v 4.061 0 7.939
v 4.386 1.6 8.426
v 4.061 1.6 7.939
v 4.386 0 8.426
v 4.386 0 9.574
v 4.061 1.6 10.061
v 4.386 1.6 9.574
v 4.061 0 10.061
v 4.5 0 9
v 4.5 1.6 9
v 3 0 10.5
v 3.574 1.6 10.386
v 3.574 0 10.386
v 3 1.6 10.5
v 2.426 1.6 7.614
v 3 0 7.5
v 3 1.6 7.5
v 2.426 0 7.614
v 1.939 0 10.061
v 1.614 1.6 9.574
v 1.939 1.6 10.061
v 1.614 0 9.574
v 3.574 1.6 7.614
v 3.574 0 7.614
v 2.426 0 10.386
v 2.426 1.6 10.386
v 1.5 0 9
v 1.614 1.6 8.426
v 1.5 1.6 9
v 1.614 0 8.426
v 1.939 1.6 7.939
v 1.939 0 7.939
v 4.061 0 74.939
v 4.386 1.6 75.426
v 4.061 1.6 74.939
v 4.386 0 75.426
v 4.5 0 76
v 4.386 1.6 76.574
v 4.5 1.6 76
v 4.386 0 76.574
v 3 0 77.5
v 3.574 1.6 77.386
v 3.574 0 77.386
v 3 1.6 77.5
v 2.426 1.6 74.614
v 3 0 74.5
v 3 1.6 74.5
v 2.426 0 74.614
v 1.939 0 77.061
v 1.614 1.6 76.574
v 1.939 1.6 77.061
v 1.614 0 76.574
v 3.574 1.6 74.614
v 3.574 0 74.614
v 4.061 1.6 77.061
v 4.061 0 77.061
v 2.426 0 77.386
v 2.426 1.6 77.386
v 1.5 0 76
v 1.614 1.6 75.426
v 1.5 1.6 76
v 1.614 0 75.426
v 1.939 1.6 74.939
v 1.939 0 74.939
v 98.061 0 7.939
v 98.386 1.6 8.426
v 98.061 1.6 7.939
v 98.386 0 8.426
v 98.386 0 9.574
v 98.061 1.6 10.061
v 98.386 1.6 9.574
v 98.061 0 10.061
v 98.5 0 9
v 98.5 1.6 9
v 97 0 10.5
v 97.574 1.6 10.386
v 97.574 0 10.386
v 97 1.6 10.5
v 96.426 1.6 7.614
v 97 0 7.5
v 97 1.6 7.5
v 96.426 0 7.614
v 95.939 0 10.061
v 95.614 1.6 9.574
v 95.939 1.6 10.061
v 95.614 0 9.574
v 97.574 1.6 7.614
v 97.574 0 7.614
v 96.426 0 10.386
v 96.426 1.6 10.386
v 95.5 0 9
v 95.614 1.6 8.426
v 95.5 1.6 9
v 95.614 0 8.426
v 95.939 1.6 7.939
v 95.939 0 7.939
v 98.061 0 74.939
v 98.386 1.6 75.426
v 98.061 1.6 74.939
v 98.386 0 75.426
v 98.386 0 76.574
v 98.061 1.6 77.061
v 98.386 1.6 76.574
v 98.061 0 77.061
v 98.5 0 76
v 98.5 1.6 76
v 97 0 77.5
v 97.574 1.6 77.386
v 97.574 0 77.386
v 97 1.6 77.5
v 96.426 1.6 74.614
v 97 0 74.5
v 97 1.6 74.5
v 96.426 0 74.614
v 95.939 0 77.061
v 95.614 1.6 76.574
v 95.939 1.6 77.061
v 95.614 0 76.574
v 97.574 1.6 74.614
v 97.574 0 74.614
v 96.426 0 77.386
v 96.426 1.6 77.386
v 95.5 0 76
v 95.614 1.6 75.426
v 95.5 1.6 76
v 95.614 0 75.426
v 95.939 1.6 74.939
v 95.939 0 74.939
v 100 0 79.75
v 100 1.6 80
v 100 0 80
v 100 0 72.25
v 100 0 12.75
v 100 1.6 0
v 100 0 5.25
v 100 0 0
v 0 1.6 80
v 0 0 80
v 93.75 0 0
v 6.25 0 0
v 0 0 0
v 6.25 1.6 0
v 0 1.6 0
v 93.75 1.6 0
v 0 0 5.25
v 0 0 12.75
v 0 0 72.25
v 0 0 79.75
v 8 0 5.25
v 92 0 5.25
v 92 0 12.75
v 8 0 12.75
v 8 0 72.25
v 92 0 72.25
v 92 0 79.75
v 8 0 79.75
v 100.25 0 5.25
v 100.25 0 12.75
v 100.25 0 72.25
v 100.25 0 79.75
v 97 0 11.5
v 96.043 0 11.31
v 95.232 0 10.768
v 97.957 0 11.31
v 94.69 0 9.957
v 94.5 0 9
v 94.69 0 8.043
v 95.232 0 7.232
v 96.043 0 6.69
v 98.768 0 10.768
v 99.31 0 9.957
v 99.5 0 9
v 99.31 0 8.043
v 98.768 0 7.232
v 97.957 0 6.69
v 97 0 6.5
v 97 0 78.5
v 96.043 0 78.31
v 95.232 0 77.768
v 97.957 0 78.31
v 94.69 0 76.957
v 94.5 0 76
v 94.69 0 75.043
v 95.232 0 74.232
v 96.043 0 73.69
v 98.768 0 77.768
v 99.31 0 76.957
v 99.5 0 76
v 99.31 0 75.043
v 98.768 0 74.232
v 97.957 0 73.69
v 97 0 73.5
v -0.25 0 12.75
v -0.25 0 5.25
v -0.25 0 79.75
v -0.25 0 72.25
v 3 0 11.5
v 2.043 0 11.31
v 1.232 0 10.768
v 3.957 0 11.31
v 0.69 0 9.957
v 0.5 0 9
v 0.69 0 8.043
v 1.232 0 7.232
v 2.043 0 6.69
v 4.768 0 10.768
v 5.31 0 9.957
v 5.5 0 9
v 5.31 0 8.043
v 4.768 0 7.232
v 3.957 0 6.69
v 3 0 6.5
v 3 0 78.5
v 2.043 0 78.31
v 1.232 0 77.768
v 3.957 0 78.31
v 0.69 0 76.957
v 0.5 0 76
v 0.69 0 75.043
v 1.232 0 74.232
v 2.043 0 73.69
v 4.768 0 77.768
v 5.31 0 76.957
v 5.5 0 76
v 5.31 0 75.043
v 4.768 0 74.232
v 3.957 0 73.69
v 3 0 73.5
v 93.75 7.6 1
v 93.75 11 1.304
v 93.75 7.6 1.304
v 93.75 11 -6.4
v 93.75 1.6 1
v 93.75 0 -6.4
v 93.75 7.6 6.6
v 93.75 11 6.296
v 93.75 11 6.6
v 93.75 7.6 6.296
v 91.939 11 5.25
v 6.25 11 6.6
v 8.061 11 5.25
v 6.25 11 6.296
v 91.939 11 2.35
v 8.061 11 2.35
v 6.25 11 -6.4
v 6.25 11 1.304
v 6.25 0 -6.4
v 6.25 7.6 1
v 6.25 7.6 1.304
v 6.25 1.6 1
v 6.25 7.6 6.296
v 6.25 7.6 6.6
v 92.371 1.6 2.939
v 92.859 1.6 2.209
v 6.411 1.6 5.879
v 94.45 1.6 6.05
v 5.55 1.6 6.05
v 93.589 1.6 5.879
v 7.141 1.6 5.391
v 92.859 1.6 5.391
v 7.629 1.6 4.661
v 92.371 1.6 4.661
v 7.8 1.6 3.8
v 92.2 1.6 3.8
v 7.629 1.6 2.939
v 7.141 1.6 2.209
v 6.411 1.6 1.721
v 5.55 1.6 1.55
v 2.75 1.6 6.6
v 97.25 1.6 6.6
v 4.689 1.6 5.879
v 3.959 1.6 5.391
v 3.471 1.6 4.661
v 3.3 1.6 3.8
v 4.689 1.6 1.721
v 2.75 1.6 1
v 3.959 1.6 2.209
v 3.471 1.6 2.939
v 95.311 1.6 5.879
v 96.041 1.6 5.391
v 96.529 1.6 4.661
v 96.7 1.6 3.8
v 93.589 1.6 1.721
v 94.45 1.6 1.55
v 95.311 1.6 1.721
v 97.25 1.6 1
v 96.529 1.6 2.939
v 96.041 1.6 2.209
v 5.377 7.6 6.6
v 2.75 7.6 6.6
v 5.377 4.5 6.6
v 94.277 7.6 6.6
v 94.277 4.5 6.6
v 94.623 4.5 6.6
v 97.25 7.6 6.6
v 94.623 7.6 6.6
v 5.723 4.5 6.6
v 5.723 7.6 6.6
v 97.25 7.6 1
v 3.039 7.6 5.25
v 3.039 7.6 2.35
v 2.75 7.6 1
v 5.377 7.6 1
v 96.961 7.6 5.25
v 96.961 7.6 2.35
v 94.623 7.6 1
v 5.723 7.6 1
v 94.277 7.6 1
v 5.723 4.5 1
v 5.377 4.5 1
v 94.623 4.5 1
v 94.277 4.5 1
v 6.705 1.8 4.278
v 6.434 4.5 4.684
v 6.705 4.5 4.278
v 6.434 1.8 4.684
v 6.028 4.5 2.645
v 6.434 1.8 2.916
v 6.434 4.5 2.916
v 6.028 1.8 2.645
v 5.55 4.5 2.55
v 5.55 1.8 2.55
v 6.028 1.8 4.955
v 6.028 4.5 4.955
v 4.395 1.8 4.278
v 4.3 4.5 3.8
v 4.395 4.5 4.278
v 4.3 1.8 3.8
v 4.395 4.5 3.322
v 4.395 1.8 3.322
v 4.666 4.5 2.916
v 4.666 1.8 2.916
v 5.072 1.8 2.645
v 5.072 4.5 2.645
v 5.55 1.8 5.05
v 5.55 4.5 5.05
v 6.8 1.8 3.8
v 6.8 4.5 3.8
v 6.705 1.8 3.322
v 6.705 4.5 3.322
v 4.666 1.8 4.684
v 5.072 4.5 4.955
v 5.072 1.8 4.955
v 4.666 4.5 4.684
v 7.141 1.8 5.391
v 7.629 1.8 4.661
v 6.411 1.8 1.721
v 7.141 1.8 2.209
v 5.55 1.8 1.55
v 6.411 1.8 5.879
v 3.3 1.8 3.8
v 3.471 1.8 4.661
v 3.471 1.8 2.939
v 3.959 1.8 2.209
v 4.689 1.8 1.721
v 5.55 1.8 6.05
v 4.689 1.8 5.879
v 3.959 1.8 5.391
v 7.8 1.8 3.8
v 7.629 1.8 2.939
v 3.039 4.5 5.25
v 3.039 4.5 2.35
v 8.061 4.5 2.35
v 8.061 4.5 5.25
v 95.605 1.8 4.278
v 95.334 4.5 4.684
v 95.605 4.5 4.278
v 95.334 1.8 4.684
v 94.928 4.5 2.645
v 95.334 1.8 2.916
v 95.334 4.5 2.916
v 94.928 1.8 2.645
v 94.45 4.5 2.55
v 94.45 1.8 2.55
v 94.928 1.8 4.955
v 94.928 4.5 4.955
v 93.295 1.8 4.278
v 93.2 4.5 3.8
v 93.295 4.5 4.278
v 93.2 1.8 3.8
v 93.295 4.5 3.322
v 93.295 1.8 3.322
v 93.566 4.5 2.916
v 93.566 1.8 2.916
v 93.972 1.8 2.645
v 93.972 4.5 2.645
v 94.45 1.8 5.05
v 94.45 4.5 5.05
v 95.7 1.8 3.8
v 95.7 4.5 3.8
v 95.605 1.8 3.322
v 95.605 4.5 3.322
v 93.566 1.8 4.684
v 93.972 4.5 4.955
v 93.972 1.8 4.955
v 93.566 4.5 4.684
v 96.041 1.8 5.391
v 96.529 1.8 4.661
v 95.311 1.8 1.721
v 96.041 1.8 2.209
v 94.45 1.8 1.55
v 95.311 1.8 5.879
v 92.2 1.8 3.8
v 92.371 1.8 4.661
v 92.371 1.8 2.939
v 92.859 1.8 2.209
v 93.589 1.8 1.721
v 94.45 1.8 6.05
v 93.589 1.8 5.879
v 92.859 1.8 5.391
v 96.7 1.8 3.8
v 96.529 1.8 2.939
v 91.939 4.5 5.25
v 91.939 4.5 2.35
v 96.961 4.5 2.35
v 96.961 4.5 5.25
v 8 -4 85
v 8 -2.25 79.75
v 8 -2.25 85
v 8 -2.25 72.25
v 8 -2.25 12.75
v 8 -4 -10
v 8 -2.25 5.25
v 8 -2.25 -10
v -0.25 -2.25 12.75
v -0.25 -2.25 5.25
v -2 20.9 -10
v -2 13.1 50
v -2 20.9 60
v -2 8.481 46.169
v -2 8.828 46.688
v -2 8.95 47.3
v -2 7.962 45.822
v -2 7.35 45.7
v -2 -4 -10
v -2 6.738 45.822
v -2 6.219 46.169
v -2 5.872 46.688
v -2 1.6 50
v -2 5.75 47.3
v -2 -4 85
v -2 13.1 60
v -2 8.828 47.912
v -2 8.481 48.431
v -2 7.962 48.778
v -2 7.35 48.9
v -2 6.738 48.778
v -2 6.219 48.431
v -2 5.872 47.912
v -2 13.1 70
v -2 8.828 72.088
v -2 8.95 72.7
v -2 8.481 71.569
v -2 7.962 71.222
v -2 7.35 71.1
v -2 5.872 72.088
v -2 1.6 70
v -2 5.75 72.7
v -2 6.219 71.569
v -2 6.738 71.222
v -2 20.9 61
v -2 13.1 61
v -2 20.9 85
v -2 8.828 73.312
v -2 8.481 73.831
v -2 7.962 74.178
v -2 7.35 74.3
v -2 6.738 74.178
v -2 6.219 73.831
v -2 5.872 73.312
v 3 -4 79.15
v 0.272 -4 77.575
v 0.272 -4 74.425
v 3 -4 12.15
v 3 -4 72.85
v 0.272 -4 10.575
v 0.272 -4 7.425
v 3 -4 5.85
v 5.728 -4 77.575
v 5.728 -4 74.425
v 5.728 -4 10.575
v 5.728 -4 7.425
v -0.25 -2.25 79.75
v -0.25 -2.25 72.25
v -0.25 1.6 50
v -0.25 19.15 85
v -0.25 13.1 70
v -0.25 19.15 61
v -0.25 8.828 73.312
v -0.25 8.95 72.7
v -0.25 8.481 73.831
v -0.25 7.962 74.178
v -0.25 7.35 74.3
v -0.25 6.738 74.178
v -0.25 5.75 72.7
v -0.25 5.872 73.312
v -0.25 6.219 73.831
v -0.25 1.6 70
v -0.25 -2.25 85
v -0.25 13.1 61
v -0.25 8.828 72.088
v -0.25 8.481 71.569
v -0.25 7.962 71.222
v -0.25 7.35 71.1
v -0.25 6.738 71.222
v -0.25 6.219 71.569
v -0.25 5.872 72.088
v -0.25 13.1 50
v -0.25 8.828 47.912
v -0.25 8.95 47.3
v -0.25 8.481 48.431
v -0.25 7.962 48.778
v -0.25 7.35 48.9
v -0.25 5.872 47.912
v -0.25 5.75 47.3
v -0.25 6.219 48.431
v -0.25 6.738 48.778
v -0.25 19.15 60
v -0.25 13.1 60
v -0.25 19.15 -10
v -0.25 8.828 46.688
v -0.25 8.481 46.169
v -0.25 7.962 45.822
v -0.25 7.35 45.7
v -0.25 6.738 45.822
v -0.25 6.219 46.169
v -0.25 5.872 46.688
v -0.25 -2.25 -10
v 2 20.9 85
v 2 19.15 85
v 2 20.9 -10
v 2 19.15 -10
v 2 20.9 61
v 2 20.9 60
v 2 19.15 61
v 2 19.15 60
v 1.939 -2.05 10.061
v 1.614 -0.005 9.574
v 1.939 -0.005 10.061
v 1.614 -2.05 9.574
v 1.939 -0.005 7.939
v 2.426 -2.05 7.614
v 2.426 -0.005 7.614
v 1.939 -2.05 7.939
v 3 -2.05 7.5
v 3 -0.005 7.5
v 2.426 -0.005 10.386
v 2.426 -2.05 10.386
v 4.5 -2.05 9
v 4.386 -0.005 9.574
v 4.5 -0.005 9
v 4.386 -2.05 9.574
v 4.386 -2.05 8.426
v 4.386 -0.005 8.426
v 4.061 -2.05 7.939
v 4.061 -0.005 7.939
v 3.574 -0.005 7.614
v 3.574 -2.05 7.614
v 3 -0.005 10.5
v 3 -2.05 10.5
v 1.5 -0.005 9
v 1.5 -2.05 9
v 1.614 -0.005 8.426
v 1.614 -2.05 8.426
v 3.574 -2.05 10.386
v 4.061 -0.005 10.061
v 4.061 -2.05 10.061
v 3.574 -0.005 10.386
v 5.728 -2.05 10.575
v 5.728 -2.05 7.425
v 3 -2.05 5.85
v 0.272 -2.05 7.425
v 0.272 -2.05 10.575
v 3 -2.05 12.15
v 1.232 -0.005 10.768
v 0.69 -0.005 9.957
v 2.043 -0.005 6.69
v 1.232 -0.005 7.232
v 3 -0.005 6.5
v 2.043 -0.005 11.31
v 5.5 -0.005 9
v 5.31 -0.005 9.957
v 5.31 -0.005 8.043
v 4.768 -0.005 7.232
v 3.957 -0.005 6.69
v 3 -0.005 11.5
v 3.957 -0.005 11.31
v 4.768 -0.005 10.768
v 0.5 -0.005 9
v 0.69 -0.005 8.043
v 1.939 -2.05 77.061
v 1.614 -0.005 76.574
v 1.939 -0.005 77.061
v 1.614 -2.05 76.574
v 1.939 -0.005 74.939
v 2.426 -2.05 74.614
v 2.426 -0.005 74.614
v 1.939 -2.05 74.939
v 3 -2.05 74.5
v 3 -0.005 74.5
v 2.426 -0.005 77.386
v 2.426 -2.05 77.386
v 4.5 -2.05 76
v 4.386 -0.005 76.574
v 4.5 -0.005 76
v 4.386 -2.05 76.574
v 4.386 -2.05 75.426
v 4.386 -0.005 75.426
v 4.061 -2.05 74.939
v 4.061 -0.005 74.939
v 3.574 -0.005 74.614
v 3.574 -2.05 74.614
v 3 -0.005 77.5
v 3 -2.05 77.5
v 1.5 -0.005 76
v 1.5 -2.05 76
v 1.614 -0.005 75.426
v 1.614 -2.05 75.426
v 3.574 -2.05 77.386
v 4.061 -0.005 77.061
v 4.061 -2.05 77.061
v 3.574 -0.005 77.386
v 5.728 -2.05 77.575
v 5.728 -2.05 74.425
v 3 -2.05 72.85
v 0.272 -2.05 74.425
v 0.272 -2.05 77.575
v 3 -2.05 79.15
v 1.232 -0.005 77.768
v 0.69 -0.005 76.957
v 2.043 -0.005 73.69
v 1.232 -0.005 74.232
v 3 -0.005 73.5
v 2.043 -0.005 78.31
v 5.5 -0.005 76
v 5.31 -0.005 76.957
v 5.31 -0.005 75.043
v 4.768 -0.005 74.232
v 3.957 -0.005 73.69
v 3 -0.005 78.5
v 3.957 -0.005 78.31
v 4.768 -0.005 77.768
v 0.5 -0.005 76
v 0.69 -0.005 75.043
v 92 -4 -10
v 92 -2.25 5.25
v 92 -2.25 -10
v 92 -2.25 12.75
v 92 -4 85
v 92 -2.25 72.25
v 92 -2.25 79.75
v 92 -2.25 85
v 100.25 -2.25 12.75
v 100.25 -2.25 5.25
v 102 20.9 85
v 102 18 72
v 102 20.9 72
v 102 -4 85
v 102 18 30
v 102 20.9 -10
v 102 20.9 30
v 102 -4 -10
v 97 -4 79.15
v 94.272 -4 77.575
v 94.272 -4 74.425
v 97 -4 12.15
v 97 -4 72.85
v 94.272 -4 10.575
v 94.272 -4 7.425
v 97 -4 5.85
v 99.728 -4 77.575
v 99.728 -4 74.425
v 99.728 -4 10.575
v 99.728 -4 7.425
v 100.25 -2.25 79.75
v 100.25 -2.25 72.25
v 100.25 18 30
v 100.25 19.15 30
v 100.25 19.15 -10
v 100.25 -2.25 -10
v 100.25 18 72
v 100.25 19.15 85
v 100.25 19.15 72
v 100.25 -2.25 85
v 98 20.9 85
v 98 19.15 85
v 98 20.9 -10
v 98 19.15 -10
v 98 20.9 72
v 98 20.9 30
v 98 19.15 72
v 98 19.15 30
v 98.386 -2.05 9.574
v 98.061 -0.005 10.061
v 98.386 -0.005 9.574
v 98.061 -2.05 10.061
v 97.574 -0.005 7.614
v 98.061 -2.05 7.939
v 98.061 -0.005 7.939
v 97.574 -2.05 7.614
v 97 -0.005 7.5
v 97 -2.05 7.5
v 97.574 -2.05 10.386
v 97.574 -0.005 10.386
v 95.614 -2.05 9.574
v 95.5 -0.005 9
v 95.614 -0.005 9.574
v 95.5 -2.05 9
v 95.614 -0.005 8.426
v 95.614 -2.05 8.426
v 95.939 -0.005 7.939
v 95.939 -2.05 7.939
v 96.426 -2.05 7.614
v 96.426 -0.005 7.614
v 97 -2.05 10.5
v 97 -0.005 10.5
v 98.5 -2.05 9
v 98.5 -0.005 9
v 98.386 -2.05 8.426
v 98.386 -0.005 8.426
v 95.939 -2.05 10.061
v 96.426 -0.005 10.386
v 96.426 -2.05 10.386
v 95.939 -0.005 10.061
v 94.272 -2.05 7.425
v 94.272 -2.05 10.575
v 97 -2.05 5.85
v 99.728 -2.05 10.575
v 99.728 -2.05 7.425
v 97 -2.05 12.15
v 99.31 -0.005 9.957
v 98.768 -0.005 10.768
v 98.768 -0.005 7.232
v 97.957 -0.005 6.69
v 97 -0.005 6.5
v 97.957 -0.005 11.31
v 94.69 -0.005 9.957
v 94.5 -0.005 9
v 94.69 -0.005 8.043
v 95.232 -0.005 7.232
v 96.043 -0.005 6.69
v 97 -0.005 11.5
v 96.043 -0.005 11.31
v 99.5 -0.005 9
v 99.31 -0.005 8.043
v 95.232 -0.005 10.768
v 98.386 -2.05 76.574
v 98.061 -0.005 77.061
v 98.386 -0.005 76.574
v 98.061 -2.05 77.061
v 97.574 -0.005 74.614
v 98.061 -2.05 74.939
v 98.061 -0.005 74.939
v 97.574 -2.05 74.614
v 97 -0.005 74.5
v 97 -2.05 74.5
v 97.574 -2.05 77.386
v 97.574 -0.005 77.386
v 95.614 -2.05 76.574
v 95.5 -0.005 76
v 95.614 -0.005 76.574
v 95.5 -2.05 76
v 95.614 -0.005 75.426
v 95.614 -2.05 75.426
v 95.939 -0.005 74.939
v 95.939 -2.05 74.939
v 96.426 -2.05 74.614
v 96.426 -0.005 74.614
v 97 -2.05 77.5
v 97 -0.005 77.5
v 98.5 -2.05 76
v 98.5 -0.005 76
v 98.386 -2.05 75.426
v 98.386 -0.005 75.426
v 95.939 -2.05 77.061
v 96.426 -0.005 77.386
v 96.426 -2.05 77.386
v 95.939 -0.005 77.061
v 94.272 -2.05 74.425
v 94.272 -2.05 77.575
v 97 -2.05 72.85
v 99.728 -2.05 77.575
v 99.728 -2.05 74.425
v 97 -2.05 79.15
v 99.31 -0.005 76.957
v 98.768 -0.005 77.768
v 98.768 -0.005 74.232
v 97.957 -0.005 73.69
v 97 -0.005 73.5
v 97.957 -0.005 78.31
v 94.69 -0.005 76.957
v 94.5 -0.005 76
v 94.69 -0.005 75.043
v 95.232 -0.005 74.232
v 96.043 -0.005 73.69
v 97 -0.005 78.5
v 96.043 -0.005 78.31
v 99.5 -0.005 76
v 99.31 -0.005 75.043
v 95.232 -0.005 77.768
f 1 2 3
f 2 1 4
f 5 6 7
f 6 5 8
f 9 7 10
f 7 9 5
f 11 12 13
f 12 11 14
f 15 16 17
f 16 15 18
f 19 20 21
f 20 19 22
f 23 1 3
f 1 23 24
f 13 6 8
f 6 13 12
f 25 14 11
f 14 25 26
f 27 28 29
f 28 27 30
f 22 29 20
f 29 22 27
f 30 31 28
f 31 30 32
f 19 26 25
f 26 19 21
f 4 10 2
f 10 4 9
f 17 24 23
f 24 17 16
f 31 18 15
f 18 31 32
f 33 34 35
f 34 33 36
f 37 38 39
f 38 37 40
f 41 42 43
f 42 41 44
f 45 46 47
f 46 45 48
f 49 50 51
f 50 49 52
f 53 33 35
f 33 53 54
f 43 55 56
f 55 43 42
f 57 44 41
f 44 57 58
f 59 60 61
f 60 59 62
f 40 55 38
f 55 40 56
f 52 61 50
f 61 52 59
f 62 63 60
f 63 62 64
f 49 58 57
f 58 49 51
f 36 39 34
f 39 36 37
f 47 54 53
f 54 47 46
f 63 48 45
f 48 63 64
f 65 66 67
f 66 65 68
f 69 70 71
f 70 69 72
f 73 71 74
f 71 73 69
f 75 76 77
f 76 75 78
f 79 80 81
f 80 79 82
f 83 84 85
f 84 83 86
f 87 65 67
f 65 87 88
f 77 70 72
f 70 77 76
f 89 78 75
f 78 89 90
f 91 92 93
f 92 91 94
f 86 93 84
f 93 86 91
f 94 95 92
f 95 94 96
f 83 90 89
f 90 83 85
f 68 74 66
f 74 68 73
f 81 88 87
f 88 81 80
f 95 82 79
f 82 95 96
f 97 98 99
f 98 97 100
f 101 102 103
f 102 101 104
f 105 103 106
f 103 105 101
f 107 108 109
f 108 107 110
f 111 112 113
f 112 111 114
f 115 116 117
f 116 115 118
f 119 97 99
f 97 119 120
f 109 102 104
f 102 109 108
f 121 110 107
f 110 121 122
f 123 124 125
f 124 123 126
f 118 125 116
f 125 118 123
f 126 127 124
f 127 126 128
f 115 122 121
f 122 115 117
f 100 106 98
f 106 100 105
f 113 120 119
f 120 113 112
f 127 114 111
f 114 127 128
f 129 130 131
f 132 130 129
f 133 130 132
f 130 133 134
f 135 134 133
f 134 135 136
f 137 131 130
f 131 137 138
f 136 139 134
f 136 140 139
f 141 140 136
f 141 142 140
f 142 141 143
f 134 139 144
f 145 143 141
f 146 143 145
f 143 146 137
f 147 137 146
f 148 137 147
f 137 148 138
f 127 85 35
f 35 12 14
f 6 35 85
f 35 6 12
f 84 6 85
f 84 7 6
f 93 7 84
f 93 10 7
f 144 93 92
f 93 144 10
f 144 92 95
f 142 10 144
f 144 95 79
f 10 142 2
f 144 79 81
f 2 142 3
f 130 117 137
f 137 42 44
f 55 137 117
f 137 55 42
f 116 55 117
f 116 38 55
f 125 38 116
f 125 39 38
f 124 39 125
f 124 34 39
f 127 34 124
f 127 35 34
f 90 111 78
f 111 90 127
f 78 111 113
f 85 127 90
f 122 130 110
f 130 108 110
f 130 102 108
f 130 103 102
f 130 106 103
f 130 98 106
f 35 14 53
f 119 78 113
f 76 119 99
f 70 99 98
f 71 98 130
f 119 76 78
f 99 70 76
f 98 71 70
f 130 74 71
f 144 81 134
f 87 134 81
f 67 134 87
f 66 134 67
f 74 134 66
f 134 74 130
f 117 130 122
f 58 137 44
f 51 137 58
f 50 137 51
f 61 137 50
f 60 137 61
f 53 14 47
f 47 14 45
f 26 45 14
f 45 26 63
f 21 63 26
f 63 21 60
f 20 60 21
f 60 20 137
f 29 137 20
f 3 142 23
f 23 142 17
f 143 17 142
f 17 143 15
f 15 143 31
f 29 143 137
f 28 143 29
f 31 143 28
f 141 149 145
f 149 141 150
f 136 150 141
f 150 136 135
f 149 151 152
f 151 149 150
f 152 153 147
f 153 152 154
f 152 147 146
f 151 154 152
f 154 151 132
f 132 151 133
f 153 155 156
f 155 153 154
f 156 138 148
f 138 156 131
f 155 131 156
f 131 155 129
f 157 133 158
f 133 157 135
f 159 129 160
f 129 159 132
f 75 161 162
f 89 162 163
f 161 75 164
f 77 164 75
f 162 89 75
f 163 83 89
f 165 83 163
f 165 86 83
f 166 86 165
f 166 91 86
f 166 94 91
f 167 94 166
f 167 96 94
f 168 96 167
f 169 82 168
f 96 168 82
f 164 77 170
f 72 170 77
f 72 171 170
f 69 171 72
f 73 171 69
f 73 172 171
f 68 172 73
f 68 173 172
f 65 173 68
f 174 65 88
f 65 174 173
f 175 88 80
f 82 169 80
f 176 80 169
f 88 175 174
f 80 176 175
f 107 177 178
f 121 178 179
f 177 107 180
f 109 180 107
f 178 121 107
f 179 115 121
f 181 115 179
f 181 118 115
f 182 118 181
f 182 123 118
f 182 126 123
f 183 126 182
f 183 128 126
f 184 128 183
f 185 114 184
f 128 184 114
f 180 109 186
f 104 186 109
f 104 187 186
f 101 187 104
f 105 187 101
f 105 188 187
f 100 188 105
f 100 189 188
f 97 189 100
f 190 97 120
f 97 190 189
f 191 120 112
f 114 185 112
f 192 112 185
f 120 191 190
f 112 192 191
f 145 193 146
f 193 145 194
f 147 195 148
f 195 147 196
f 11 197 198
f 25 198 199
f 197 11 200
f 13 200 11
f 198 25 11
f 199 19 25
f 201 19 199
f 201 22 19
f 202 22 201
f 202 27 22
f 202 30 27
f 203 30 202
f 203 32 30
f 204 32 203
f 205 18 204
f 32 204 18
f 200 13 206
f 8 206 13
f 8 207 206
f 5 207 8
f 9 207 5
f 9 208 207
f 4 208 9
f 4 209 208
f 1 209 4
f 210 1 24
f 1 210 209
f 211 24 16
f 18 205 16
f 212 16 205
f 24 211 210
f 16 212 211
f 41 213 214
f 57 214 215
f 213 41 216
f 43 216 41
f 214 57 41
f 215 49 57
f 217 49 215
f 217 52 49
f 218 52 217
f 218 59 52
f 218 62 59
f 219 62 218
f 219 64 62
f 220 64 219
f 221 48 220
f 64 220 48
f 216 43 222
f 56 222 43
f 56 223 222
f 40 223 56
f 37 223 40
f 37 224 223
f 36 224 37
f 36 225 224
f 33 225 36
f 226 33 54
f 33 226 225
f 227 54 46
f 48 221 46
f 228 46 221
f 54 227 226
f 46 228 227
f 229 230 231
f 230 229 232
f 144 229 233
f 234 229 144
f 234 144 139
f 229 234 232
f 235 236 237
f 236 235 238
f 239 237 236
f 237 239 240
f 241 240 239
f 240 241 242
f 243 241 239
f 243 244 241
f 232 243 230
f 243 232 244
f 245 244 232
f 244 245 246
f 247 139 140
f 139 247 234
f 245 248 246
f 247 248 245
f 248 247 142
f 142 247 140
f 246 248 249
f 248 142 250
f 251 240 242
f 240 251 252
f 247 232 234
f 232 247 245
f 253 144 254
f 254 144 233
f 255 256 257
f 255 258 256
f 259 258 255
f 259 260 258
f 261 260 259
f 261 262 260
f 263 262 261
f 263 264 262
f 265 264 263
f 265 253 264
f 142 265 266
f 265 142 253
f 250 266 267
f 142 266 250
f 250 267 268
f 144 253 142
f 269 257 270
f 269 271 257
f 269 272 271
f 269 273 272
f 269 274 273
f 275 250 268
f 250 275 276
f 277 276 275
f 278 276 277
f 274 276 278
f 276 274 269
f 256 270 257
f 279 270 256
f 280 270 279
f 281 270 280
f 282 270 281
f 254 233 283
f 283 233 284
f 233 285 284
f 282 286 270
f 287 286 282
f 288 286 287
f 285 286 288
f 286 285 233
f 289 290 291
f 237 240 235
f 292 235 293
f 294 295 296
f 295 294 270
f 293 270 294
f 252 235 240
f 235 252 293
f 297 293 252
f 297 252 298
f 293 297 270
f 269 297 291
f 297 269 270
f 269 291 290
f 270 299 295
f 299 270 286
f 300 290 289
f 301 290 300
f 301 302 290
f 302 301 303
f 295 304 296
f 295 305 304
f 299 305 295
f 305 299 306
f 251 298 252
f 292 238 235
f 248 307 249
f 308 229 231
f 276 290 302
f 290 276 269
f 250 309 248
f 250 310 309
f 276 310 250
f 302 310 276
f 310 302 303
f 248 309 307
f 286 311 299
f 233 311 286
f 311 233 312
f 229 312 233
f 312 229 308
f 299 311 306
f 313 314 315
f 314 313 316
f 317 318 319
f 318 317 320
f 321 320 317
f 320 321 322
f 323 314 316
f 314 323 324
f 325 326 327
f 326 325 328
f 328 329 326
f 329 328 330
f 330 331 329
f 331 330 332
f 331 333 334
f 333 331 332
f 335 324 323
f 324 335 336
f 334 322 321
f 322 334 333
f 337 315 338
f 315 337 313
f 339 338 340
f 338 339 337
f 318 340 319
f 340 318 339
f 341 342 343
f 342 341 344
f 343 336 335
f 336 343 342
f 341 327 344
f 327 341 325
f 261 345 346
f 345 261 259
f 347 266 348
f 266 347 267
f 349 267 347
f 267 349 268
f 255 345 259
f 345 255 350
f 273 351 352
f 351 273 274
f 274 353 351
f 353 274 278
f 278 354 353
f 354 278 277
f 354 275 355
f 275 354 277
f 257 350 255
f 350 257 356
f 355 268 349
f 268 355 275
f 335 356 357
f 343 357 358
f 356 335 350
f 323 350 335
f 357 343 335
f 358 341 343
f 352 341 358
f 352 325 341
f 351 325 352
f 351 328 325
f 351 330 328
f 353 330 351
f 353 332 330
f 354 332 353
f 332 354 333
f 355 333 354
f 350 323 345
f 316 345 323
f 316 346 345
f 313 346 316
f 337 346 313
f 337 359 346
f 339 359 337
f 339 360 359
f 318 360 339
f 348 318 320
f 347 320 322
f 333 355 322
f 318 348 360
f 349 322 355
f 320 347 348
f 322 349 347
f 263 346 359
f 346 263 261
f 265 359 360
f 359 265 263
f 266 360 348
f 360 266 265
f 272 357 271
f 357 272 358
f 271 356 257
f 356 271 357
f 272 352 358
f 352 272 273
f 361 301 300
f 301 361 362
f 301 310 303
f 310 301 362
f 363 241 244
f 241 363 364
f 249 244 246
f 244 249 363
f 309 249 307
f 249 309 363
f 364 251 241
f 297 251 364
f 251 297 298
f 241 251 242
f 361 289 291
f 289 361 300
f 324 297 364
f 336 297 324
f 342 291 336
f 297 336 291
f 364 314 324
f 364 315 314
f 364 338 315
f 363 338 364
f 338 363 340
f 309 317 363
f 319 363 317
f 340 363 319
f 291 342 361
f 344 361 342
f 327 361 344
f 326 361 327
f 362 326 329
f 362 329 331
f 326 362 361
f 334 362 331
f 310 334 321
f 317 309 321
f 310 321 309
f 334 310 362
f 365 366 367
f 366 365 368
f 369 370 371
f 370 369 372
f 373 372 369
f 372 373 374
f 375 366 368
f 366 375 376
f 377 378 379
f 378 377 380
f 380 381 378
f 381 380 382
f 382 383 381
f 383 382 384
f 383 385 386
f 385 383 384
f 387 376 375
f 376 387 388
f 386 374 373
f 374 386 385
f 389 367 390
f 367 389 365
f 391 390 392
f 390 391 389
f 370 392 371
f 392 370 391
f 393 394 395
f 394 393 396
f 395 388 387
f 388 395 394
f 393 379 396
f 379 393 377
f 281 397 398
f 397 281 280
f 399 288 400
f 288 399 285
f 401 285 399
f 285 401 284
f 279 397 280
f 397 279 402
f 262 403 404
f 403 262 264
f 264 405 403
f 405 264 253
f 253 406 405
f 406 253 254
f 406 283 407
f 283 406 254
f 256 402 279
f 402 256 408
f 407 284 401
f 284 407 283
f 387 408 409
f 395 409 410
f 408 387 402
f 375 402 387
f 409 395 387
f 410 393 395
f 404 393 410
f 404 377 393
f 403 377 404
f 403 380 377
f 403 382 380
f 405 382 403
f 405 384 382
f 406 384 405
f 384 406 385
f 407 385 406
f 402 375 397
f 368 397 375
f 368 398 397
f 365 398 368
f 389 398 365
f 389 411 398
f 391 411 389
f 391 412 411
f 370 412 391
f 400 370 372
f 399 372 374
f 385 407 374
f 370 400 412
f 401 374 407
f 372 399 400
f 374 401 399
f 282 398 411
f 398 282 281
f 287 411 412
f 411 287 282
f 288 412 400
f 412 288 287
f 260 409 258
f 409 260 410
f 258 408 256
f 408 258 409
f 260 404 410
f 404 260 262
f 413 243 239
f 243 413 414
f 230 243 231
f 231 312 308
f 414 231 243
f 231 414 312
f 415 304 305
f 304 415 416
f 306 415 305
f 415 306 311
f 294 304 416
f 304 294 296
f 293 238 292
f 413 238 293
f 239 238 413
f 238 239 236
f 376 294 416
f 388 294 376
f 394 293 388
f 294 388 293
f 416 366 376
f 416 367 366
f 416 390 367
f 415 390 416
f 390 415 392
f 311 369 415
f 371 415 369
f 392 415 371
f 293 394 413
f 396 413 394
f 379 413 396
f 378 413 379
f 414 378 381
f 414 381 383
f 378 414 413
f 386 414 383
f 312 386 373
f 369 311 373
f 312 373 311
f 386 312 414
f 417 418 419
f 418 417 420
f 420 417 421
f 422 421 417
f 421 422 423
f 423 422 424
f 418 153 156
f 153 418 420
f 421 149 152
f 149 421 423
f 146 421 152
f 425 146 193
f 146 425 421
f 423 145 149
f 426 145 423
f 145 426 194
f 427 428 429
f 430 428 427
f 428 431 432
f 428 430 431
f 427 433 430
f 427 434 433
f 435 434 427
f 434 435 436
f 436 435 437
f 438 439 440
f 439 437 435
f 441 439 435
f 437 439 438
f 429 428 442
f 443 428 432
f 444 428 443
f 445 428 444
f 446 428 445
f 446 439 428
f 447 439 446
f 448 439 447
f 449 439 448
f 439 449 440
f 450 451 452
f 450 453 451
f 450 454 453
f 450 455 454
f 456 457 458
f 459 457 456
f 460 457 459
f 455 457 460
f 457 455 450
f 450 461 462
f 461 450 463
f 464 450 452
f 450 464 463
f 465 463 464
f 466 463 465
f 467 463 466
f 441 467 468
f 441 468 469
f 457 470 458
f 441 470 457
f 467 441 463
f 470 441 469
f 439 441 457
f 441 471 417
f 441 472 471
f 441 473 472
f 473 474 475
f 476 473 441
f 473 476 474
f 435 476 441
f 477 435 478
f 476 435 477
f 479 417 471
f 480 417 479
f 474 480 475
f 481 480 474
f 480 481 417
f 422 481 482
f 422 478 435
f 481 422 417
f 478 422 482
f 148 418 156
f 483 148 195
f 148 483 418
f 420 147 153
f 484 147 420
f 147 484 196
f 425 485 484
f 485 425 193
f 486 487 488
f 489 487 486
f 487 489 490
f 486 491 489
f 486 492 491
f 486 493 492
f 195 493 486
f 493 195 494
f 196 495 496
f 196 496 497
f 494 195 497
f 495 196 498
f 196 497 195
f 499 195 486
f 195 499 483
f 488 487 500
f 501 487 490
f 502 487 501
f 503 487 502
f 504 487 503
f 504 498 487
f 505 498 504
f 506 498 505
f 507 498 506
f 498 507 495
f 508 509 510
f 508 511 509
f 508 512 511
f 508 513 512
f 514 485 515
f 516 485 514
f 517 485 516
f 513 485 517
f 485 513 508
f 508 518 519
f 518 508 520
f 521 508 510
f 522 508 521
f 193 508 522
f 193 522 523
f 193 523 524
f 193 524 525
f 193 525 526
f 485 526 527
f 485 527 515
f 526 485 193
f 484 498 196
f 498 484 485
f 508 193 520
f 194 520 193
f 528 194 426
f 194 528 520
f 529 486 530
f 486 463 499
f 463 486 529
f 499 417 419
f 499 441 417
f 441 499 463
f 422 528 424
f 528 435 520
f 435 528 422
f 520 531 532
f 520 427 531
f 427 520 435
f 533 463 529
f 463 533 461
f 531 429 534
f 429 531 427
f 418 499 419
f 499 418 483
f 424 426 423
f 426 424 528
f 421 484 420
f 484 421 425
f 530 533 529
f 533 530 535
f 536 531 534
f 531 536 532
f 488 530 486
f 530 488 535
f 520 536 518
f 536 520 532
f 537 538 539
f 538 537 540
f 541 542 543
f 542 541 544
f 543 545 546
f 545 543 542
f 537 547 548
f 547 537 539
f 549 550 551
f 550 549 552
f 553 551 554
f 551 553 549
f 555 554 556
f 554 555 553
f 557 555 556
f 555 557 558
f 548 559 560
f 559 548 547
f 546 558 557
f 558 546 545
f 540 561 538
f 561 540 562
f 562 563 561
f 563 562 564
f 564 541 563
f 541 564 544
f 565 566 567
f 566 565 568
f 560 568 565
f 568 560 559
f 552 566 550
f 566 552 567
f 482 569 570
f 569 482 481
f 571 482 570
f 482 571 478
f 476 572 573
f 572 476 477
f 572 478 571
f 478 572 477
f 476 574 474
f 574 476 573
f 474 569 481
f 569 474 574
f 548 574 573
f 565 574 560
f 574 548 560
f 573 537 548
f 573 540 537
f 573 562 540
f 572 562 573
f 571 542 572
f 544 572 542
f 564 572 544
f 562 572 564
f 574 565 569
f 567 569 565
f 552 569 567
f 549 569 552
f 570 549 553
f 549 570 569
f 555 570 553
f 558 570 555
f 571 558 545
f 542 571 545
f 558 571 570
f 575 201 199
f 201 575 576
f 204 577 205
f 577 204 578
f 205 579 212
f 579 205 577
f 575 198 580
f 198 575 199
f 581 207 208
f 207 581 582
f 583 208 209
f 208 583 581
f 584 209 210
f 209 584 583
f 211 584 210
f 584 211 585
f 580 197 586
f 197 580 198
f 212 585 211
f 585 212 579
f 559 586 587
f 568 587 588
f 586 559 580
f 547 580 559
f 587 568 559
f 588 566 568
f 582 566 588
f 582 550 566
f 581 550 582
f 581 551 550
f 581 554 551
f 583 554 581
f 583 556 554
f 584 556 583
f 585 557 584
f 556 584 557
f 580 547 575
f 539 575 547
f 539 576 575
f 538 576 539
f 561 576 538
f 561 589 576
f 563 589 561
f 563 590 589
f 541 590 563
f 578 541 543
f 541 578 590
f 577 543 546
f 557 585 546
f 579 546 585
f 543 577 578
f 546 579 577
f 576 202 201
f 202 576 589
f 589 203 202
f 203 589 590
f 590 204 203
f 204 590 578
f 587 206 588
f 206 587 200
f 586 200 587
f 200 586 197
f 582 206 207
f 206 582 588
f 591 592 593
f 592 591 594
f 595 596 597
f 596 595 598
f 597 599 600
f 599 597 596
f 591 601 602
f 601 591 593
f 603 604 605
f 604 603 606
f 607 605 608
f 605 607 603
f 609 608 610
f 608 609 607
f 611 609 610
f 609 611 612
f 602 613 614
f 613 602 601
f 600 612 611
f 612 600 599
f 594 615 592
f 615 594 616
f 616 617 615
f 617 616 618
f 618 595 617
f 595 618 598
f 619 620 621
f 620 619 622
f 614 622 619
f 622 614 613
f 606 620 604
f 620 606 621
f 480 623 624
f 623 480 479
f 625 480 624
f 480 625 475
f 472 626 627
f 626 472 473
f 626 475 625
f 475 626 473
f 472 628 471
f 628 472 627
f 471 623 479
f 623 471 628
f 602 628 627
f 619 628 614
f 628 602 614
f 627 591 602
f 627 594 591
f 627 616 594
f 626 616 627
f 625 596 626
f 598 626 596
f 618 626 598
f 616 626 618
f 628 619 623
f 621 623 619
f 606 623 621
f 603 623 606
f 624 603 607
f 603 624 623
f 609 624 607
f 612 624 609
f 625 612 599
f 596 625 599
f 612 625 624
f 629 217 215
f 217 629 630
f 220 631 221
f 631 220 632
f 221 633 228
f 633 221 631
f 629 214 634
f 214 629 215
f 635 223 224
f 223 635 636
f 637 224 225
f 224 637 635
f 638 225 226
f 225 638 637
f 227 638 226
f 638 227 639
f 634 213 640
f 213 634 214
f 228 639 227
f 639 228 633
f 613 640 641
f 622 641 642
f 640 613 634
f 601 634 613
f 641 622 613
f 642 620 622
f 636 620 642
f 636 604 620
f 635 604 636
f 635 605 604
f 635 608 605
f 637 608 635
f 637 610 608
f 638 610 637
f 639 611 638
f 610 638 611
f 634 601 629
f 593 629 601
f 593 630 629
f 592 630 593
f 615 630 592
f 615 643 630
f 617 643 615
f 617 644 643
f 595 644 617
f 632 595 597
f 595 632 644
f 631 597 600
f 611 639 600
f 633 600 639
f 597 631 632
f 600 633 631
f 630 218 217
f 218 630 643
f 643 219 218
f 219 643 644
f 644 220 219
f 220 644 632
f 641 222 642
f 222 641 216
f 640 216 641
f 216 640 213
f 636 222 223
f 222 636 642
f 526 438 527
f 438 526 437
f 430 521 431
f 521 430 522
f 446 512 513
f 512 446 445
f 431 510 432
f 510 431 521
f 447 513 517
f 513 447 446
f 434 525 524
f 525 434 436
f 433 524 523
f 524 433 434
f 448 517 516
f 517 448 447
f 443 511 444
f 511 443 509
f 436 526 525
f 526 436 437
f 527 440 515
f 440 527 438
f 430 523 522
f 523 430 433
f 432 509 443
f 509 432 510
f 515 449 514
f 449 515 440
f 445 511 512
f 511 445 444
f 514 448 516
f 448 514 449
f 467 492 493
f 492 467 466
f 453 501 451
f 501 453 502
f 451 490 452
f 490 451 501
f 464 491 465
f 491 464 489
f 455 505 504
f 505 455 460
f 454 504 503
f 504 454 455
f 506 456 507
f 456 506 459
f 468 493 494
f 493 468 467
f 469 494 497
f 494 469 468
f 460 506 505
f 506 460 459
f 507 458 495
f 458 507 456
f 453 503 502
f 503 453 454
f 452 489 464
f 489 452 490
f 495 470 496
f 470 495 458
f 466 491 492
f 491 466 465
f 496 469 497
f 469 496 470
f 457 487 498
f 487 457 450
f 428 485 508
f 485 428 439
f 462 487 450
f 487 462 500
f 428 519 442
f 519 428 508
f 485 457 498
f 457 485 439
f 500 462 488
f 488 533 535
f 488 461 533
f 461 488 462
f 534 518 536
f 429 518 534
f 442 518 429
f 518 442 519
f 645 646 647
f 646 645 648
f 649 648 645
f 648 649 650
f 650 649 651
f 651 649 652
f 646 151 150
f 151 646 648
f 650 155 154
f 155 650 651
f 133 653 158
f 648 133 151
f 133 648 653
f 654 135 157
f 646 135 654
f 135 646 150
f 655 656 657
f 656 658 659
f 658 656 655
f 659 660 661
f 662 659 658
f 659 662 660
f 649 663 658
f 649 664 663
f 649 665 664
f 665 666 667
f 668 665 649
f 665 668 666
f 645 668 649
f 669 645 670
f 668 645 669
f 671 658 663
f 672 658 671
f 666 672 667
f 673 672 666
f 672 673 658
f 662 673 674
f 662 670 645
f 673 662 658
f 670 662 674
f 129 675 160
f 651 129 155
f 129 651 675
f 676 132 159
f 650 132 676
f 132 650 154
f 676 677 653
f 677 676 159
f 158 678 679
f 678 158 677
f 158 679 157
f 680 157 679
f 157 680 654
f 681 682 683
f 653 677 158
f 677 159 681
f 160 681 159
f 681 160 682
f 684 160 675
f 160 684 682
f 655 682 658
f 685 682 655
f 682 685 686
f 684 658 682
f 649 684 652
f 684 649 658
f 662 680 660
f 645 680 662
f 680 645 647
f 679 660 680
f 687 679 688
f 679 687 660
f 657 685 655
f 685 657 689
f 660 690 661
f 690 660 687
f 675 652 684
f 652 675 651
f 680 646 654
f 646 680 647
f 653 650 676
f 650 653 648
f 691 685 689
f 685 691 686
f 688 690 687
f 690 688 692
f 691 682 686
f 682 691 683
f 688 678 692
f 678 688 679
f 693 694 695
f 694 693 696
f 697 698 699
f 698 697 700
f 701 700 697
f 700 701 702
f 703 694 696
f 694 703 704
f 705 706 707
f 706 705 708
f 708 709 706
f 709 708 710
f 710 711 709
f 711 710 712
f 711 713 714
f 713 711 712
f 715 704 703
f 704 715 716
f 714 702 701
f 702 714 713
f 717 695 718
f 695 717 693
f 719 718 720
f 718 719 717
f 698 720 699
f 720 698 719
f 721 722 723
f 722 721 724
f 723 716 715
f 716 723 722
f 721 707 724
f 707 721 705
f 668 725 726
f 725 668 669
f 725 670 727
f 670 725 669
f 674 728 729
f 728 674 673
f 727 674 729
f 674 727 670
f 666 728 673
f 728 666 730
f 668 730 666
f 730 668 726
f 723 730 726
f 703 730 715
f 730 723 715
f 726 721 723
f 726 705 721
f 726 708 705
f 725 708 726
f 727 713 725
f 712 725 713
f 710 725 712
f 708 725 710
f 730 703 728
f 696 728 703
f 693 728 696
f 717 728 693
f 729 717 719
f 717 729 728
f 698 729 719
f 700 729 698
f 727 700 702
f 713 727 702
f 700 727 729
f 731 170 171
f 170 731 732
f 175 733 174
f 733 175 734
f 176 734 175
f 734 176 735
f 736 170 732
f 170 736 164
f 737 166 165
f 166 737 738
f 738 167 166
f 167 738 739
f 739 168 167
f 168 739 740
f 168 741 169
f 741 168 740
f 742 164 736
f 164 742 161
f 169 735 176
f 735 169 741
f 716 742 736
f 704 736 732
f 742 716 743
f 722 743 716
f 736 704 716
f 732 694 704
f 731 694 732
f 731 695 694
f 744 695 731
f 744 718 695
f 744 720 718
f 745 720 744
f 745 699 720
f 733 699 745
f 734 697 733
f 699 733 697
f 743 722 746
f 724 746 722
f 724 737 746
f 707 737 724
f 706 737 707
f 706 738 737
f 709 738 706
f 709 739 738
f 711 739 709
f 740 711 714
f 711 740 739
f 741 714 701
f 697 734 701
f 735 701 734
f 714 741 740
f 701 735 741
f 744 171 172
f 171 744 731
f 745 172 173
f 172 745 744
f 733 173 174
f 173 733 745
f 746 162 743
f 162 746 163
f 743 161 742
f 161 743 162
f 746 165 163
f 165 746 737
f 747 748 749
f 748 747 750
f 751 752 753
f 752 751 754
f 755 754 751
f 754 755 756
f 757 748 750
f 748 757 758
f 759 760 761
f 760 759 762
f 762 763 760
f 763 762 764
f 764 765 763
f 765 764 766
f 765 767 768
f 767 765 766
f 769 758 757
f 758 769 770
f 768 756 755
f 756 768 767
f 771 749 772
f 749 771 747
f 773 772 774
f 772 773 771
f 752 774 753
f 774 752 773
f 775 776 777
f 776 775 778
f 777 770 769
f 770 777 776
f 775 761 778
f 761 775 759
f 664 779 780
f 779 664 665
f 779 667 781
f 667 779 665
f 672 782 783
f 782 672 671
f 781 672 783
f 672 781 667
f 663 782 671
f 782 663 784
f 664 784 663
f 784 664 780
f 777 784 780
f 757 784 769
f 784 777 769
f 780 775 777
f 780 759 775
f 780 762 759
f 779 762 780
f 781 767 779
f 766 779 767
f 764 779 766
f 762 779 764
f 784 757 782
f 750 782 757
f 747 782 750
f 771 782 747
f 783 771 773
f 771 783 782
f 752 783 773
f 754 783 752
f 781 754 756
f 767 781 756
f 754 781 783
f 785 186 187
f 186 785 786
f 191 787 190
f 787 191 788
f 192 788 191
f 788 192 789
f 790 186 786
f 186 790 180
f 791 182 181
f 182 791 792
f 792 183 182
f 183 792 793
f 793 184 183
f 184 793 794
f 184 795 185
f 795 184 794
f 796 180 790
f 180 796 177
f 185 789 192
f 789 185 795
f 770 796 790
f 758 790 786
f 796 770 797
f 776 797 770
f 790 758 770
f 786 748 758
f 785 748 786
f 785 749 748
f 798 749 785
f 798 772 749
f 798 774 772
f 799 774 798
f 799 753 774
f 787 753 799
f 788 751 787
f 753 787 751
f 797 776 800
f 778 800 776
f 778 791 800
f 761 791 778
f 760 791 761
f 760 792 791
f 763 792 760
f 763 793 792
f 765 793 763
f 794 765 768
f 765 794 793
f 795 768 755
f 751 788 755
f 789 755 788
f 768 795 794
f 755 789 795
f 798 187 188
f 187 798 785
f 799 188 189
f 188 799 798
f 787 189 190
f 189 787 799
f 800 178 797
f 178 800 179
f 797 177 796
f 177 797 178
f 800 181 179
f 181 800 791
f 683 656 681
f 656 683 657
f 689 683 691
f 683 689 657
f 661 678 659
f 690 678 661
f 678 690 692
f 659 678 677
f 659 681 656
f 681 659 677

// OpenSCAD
// file: ../library/din41612/din41612_male.scad
// din41612 male connector
// =======================

include <din41612_male_dim.scad>

use <../linurs/linurs_screw.scad>

module din41612_male(){ 
  // color("LightGrey")
  difference(){
    union(){
        translate([0,din41612_male_w1/2,din41612_male_h/2-din41612_male_h1])  
        cube([din41612_male_l1,
              din41612_male_w1,
              din41612_male_h],
             center=true);  
      translate([0,(din41612_male_w1-din41612_male_w)/2,(din41612_male_h-din41612_male_h1)/2]) 
        cube([din41612_male_l1,
              (din41612_male_w-din41612_male_w1),
              din41612_male_h-din41612_male_h1],
             center=true);  
      translate([0,din41612_male_w2/2+din41612_male_w1-din41612_male_w,din41612_male_h2/2])
        cube([din41612_male_l,
              din41612_male_w2,
              din41612_male_h2],
             center=true);  
    }
    for(i=[-1,1]){ // mounting holes
      translate([i*din41612_male_dl/2,
                 din41612_male_w1-din41612_male_w+din41612_male_w2/2, 
                 din41612_male_h1])
      rotate([180,0,90])screw_fix(
            w=din41612_male_h2, 
            d=M2_5, 
            type=head_cyl, 
            nut_sink=din41612_male_h,
            t=0);
    }
  }
}
din41612_male();  
// file: ../library/din41612/din41612_male_dim.scad
include <../linurs/linurs_screw_dim.scad>

// connector dimensions
din41612_male_l=94.5;    // lenght of the connector
din41612_male_l1=87.5;   // 
din41612_male_w=13;      // width of the connector
din41612_male_w1=6.4;    // 
din41612_male_w2=5.6;    // 
din41612_male_h=11;      // height of the connector
din41612_male_h1=1.6;    // 
din41612_male_h2=6;      // 

din41612_male_dl=88.9;   // distance between mounting holes
// file: ../library/din41612/din41612_female_dim.scad
include <../linurs/linurs_screw_dim.scad>

// connector dimensions
din41612_female_l=95;       // lenght of the connector
din41612_female_l1=85;      // lenght of the connector head
din41612_female_h=11.6;     // height of the connector
din41612_female_h1=5.2;     // height produced by the connector when pulgged in 
din41612_female_w=11;       // width of the connector
din41612_female_w1=8.5;     // width of the connector head

din41612_female_dl=90;      // distance between mounting holes
// file: ../pcb/pcb.scad
// pcb
// ===
// The pcb is the master object and has its 
// lower left corner solder side at the origin of the 
// coordinate system 

n=2;  // [1,2,3,4,5,6,7,8]
show_pcb="assemblies"; // [assemblies,assembly,pcb]

include <pcb_dim.scad>
include <../motherboard/motherboard_dim.scad>

use <../library/din41612/din41612_male.scad>

module pcb(){
  echo("pcb");  
  color("greenyellow")
  difference(){
    cube([pcb_l,pcb_h,pcb_w]); // pcb
    for(x=[-1,1]){ // mounting holes
      for(y=[pcb_wd1,pcb_wd1+pcb_wd]){
        translate([x*pcb_ld/2+pcb_l/2,0,y])
        rotate([90,0,0])
        cylinder(d=pcb_d,h=3*pcb_h,center=true,$fn=16);
      }
    }
  }
}

module pcb_assembly(){
  echo("pcb assembly");  
  pcb();  
  translate([pcb_l/2,pcb_h,0])  
  rotate([-90,0,0])din41612_male();  
}

module pcb_assemblies(n=1){
  echo("pcb assemblies"); 
  for(i=[0:n-1]){ // add the connectors
      echo(i);
      translate([0,step*i,0])
      pcb_assembly();
  }    
}    

if(show_pcb=="assemblies"){
  pcb_assemblies(n=n);
}

if(show_pcb=="assembly"){
  pcb_assembly();
}

if(show_pcb=="pcb"){
    // Move to center to create 2D drawings from top view 
    // with script OpenSCAD22d.py
    //
    rotate([90,0,180])
    //
    translate([-pcb_l/2,-pcb_h/2,-pcb_w/2])
    pcb();
}
// file: ../bracket/bracket.scad
// bracket
// =======
// A bracket of the elecbox module
// - type: 0 front bracket, 1 rear bracket
// - width 1..n in steps

// parameters for customizer
// bracket width
n=2; // [1,2,3,4,5,6,7,8]
// type
bracket="Front"; // [Front,Back]
// intermediate mounting holes
intermediate=false;  

include <../pcb/pcb_dim.scad>

include <../motherboard/motherboard_dim.scad>
include <../library/linurs/linurs_screw_dim.scad>
include <bracket_dim.scad>

use <../library/linurs/linurs_screw.scad>
    
module back_bracket(n=1, intermediate=false){
  mirror([1,0,0])       // mirror it if desired
  front_bracket(n=n, intermediate=intermediate); 
}
    
module front_bracket(n=1, intermediate=false){
  echo("bracket");  
  //color("White")
  intermediatestep=(intermediate)?step:0; 
  difference(){
    union(){
      translate([-bracket_h2/2-bracket_gap/2,
                 bracket_w(n)/2-bracket_w1,
                 bracket_l/2])  
      cube([bracket_h2,
            bracket_w(n),
            bracket_l],center=true); // create the bracket front
  
      translate([bracket_h/2-bracket_h2-bracket_gap/2,
                 bracket_t/2-bracket_w1,
                 bracket_l/2]) 
      cube([bracket_h,
            bracket_t,
            bracket_l],center=true); // U shape side of the screw
      
      translate([bracket_h1/2-bracket_h2-bracket_gap/2,
                 bracket_w(n)-bracket_w1-bracket_t/2,
                 bracket_l/2]) 
      cube([bracket_h1,
            bracket_t,
            bracket_l],center=true); // U shape where no screw  
      for(x=[1:n]){  // create the mounting hole cubes 
        for(z=[bracket_l1,
               bracket_l1+bracket_ld]){
          translate([ bracket_h/2-bracket_h2-bracket_gap/2,
                     -bracket_w1/2+(x-1)*intermediatestep,
                     z])
          cube([bracket_h,
                bracket_w1,
                bracket_l2],center=true);
        }
      }   
    }
    for(x=[1:n]){ // create the mounting hole 
      for(z=[bracket_l1,
             bracket_l1+bracket_ld]){
        translate([bracket_h3-bracket_h2-bracket_gap/2,
                  -bracket_w1/2+(x-1)*intermediatestep,
                   z])
        rotate([0,90,0])
        rotate([-90,0,0])
        screw_fix(w=bracket_w1,d=bracket_screw,type=head_no, t=bracket_screw_gap);
      }
    }
  }
}

if(bracket=="Front"){
  front_bracket(intermediate=intermediate,n=n);
}

if(bracket=="Back"){
  back_bracket(intermediate=intermediate,n=n);
}
// file: ../library/linurs/linurs_screw.scad
// Metric screws and nuts 
// urs@linurs.org 2019
// It is targeted for 3D printing applications. 
// To look realistic is not the goal (Example: Nuts do not have a hole)

include <linurs_screw_dim.scad>

d=0; //[0:M2_5,1:M3,2:M4,3:M5]
type=0;//[0:head_cyl,1:head_cnt,2:head_no,3:head_hex]
w=15; 
i=10;
nut_sink=0;
screw_sink=0; 
t=0.01;
fn=16;

/* [hex_bolt] */
show_hex_bolt=false;

/* [nut] */
show_nut=false;

/* [screw] */
show_screw=false;

/* [screw_fix] */
show_screw_fix=false;

/* [screw_cut] */
show_screw_cut=false;

/* [nut_cut] */
show_nut_cut=false;
wi=0; 
rot=false;

// functions used multiple times to position nuts and heads
function headh_cyl(d)=screw_cyl[d][1];  // height of cyl screw head
function headh_cnt(d)=screw_cyl[d][1];  // height of cnt screw head
function headh(d,type=head_cyl)=(type==head_cyl ? headh_cyl(d) : (type==head_cnt ? headh_cnt(d) : 0 )); // height of screw head 

function nuth(d)=screw_hex[d][2];   // height of hex nut

// head of a cylinder screw
module screw_head_cyl(d=M3, t=0)
{
  screwhd=screw_cyl[d][0]+t; // diameter of cylinder screw head
  cylinder(d=screwhd,h=headh(d=d, type=head_cyl), center=true,$fn=16); // screw head
}

// head of a countersunk screw
module screw_head_cnt(d=M3, t=0)
{
  screwd=screw_d[d]+t; 
  screwhd=screw_cnt[d][0]+t; // diameter of cylinder screw head
  cylinder(d1=screwd,d2=screwhd,h=headh(d=d,type=head_cnt), center=true,$fn=16); // screw head
}

// head of a hex screw
module screw_head_hex(d=M3, t=0)
{
    translate([0,0,-nuth(d)/2])nut(d=d, t=t);
}

// head of all screws
module screw_head(d=M3, type=head_cyl, t=0)
{ 
  if(type==head_cnt){
    screw_head_cnt(d=d, t=t);
  } else {
    if(type==head_cyl){
      screw_head_cyl(d=d, t=t);
    } else {
       if(type==head_hex){
           screw_head_hex(d=d, t=t); 
       } 
    }    
  }
}

// hex bolt 
module hex_bolt(d=M3, w=10, t=0)
{
  nutd=screw_hex[d][1]+t; // outer diameter of hex bolt
  cylinder(r=nutd/2,h=w+t, center=true,$fn=6); // nut
}

// nut 
module nut(d=M3, t=0)
{
  hex_bolt(d=d, w=nuth(d), t=t);    
}

// screw 
// w outer width of the screw = screw length + head 
module screw(w=10, d=M3, type=head_cyl, t=0){
  screwd=screw_d[d]+t;       // screw diameter
  cylinder(d=screwd, h=w, center=true,$fn=16); // screw thread length
  translate([0,0,w/2-headh(d=d,type=type)/2])
  screw_head(d=d,type=type, t=t);
}

// screw fix
// w outer width of the screw = screw length + head 
// sink additional material below to remove 
// raise additional material above to remove
module screw_fix(w=10, d=M3, type=head_cyl, screw_sink=0, nut_sink=0, t=0){
  screw(w=w, d=d, type=type, t=t);
  translate([0,0,-w/2+nuth(d)/2])
    nut(d=d,t=t);
  //additional material to be removed above the nut  
  translate([0,0,-(w+nut_sink)/2])hex_bolt(d=d,w=nut_sink+0.01,t=t);    
  //additional material to be removed above the screw head
  if(type==head_cnt){  
    translate([0,0,w/2+screw_sink])
    cylinder(d=screw_cnt[d][0]+t,h=screw_sink+0.01,center=true,$fn=16);
  }else{ 
    translate([0,0,(w+screw_sink)/2])
    cylinder(d=screw_cyl[d][0]+t,h=screw_sink+0.01,center=true,$fn=16);
  }     
}

// screw cut
// material to be extracted from object to slide in a counter sunk screw for fixation
// w height of the cut out
// i depth of the screw
module screw_cut(d=M3,w=20,i=10,t=0,fn=32){
    hsh=screw_cnt[d][1];
    ws=screw_cnt[d][0]+t;
    ds=screw_d[d]+t;
    
    translate([i/2,0,-(w-hsh)/2])
      cube([i,ws,hsh],center=true);
    
    translate([0,0,-(w-hsh)/2])
      cylinder(d=ws,h=hsh,center=true,$fn=32);
    
    translate([0,0,-(w-hsh)/2+hsh])
        cylinder(d2=ds, d1=ws, h=hsh,center=true,$fn=fn);
    
    cylinder(h=w, d=ds, center=true, $fn=fn);   
    
    translate([i/2,0,0]) 
        cube([i,ds,w],center=true);
    
    for(y=[-1,1]){
        translate([i/2,y*ds/2,-w/2+hsh])
            rotate([45,0,0])
            cube([i,sqrt(2)*(ws-ds)/2,sqrt(2)*(ws-ds)/2],center=true);
    }
}
//screw_cut();

// nut cut
// material to be extracted from object to slide in a nut for fixation
// w height of the cylinder
// i lenght of the inlet
module nut_cut(w=10, wi=0, d=M3, i=10, t=0, rot=false,type=head_cyl){ 
  r=(rot)?90:0;
  ds=(rot)?screw_hex[d][1]:screw_hex[d][0];
  rotate([0,0,r])nut(d,t);
  translate([i/2,0,0])
    cube([i,ds+t,nuth(d)+t],center=true);
  translate([0,0,-wi])
      if(type==head_cnt){    
          screw(w=w, d=d, type=type, t=t); 
        translate([0,0,w/2])
          cylinder(d=screw_cnt[d][0]+t,h=raise,center=true,$fn=16);
      }
      else{ 
          screw(w=w, d=d, type=type, t=t);   
  //      translate([0,0,0])
          //#cylinder(d=screw_cyl[d][0]+t,h=w,center=true,$fn=16);
      }       
}

if(show_hex_bolt==true){
   hex_bolt(d=d, w=w, t=t);
}

if(show_nut==true){
  nut(d=d, t=t);
}    

if(show_screw==true){
   screw(w=w, d=d, type=type, t=t);
}

if(show_screw_fix==true){
  screw_fix(w=w, d=d, type=type, nut_sink=nut_sink, screw_sink=screw_sink, t=t);
}

if(show_screw_cut==true){
  screw_cut(d=d,w=w,i=i,t=t,$fn=fn);
}    

if(show_nut_cut==true){
  nut_cut(w=w, wi=wi, d=d, i=i, t=t,rot=rot,type=type);
}  
// file: ../library/linurs/linurs_screw_dim.scad
// Metric screws and nuts 
// urs@linurs.org

// contains dimensions of linurs_screw and can be included in other 
// OpenScad files 

// Parameters in this file
// d screw diameter M2_5, M3, ... (enumeration with screw_d)
// t millimeters added to diameters 

// enumerations of metric threads
M2_5=0;
M3=1;
M4=2;
M5=3;

// enumerations screw head type
head_cyl=0; // cylinder
head_cnt=1; // countrsunk
head_no=2;  // no head at all
head_hex=3;  // no head at all

// screw diameters
screw_d=[
2.5, // M2.5
3.0, // M3
4.0, // M4
5.0  // M5
];

// sizes for hex nuts
screw_hex=[
//   s,   e,   h
 [ 5.0, 5.8, 1.7], // M2.5
 [ 5.5, 6.4, 2.0], // M3
 [ 7.0, 8.1, 2.8], // M4
 [ 8.0, 9.2, 3.5]  // M5
];

// sizes for cylinder screw heads
screw_cyl=[
//   d,   h
 [ 4.5, 1.6], // M2.5
 [ 5.5, 2.0], // M3
 [ 7.0, 2.6], // M4
 [ 8.5, 3.3]  // M5
];

// sizes for countersunk screw heads
screw_cnt=[
//   d,   h
 [ 4.7, 1.50], // M2.5
 [ 5.6, 1.65], // M3
 [ 7.4, 2.20], // M4
 [ 9.2, 2.50]  // M5
];
// file: ../motherboard/motherboard_dim.scad
include <../library/linurs/linurs_screw_dim.scad>
include <../library/din41612/din41612_female_dim.scad>
include <../library/din41612/din41612_male_dim.scad>
include <../pcb/pcb_dim.scad>
// motherboard pcb dimensions
motherboard_l=pcb_l;   // pcb width
motherboard_h=1.6;     // pcb thickness
step=25.4;             // distance between modules

function motherboard_w(n)=din41612_female_w+step*(n-1);

screw_motherboard_d=M2_5;
screw_motherboard_l=16;
motherboard_pass=0.5;// gap to fit screws 

motherboard_z_offset=-din41612_male_w1-din41612_female_h1-motherboard_h;
// file: ../bracket/bracket_dim.scad
// bracket

include <../pcb/pcb_dim.scad>
include <../motherboard/motherboard_dim.scad>
include <../library/linurs/linurs_screw_dim.scad>

bracket_screw=M2_5;   // hole for the screw

bracket_gap=0.5;      // gap between bracket to make sure it fits in the box
bracket_screw_gap=0.5;// gap to fit the screw

bracket_l=pcb_w+15;   // height of bracket
bracket_l1=19;        // hole l
bracket_l2=3*screw_d[bracket_screw];
bracket_ld=pcb_wd;    // hole distance

bracket_h=10;         // depth of the U shape at the side of the screw
bracket_h1=4;         // depth of the U shape at the side where no screw is 
bracket_h2=2-bracket_gap/2;   // thickness of bracket
bracket_h3=5;         // hole h

bracket_w1=4;         // height of the mounting hole cube
bracket_tn=2;         // thickness of bracket
bracket_t=bracket_tn-bracket_gap/2;  // thickness of bracket - gap

bracket_offset_z=-10;  // bracket offset in elecbox z axis

function bracket_w(n)=step*n-bracket_gap;
function bracket_w2(n)=step*n-2*bracket_tn;
// file: ../pcb/pcb_dim.scad
// The pcb is the master object of the project
// therefore no other include files from other objects
// are necessary

// pcb constants
pcb_l =100;  // lenght of the pcb
pcb_ld = 94; // hole distance 
pcb_w=80;    // height of the pcb
pcb_wd = 67; // hole distance
pcb_wd1 = 9; // hole to edge distance 
pcb_d=3;     // diameter of holes
pcb_h=1.6;   // thickness
// main file
// Avr module
// ==========

Avr="assembly"; // [assembly,front,back,print_front,print_back]

include <../pcb/pcb_dim.scad>
include <../bracket/bracket_dim.scad>
include <../motherboard/motherboard_dim.scad>
include <../library/linurs/linurs_screw_dim.scad>

use <../library/linurs/linurs_screw.scad>
use <../bracket/bracket.scad>
use <../pcb/pcb.scad>

module Avr_back(){
    h=4;
    w=42;
    z=30;
    difference(){
        translate([0,0,bracket_offset_z])back_bracket(n=1);
        
        translate([
          0,
          h/2+18,
          z+w/2])
        cube([
          bracket_h,
          h,
          w],center=true);       
    }
}

module Avr_front(){
    h1=11.5;
    w1=20;
    z1=50;
    
    d2=3.2;
    h2=h1/2;
    z2=25.4;
    
    h3=step;
    w3=1;
    z3=z1+w1/2;
    
    difference(){
        translate([0,0,bracket_offset_z])front_bracket(n=1);
        
        translate([
          0,
          h1/2+pcb_h,
          z1+w1/2])
        cube([
          bracket_h,
          h1,
          w1],center=true);
        
        for(i=[-1,1]){
        translate([
          0,
          h2+pcb_h,
          z1+w1/2+i*z2/2])rotate([0,90,0])
          cylinder(h=bracket_h,d=d2,center=true, $fn=16);
        }   
        
        translate([
          0,
          h3/2+pcb_h,
          z3+w3/2])
        cube([
          bracket_h,
          h3,
          w3],center=true);       
    }
}

module Avr_assembly(){
    pcb_assembly();
    Avr_front();
    translate([pcb_l,0,0])Avr_back();
}

if(Avr=="front"){
  Avr_front();
}

if(Avr=="back"){
  Avr_back();
}

if(Avr=="assembly"){
  Avr_assembly();
}

if(Avr=="print_front"){
  rotate([0,-90,0])
    Avr_front();
}

if(Avr=="print_back"){
  rotate([0,90,0])Avr_back();
}
